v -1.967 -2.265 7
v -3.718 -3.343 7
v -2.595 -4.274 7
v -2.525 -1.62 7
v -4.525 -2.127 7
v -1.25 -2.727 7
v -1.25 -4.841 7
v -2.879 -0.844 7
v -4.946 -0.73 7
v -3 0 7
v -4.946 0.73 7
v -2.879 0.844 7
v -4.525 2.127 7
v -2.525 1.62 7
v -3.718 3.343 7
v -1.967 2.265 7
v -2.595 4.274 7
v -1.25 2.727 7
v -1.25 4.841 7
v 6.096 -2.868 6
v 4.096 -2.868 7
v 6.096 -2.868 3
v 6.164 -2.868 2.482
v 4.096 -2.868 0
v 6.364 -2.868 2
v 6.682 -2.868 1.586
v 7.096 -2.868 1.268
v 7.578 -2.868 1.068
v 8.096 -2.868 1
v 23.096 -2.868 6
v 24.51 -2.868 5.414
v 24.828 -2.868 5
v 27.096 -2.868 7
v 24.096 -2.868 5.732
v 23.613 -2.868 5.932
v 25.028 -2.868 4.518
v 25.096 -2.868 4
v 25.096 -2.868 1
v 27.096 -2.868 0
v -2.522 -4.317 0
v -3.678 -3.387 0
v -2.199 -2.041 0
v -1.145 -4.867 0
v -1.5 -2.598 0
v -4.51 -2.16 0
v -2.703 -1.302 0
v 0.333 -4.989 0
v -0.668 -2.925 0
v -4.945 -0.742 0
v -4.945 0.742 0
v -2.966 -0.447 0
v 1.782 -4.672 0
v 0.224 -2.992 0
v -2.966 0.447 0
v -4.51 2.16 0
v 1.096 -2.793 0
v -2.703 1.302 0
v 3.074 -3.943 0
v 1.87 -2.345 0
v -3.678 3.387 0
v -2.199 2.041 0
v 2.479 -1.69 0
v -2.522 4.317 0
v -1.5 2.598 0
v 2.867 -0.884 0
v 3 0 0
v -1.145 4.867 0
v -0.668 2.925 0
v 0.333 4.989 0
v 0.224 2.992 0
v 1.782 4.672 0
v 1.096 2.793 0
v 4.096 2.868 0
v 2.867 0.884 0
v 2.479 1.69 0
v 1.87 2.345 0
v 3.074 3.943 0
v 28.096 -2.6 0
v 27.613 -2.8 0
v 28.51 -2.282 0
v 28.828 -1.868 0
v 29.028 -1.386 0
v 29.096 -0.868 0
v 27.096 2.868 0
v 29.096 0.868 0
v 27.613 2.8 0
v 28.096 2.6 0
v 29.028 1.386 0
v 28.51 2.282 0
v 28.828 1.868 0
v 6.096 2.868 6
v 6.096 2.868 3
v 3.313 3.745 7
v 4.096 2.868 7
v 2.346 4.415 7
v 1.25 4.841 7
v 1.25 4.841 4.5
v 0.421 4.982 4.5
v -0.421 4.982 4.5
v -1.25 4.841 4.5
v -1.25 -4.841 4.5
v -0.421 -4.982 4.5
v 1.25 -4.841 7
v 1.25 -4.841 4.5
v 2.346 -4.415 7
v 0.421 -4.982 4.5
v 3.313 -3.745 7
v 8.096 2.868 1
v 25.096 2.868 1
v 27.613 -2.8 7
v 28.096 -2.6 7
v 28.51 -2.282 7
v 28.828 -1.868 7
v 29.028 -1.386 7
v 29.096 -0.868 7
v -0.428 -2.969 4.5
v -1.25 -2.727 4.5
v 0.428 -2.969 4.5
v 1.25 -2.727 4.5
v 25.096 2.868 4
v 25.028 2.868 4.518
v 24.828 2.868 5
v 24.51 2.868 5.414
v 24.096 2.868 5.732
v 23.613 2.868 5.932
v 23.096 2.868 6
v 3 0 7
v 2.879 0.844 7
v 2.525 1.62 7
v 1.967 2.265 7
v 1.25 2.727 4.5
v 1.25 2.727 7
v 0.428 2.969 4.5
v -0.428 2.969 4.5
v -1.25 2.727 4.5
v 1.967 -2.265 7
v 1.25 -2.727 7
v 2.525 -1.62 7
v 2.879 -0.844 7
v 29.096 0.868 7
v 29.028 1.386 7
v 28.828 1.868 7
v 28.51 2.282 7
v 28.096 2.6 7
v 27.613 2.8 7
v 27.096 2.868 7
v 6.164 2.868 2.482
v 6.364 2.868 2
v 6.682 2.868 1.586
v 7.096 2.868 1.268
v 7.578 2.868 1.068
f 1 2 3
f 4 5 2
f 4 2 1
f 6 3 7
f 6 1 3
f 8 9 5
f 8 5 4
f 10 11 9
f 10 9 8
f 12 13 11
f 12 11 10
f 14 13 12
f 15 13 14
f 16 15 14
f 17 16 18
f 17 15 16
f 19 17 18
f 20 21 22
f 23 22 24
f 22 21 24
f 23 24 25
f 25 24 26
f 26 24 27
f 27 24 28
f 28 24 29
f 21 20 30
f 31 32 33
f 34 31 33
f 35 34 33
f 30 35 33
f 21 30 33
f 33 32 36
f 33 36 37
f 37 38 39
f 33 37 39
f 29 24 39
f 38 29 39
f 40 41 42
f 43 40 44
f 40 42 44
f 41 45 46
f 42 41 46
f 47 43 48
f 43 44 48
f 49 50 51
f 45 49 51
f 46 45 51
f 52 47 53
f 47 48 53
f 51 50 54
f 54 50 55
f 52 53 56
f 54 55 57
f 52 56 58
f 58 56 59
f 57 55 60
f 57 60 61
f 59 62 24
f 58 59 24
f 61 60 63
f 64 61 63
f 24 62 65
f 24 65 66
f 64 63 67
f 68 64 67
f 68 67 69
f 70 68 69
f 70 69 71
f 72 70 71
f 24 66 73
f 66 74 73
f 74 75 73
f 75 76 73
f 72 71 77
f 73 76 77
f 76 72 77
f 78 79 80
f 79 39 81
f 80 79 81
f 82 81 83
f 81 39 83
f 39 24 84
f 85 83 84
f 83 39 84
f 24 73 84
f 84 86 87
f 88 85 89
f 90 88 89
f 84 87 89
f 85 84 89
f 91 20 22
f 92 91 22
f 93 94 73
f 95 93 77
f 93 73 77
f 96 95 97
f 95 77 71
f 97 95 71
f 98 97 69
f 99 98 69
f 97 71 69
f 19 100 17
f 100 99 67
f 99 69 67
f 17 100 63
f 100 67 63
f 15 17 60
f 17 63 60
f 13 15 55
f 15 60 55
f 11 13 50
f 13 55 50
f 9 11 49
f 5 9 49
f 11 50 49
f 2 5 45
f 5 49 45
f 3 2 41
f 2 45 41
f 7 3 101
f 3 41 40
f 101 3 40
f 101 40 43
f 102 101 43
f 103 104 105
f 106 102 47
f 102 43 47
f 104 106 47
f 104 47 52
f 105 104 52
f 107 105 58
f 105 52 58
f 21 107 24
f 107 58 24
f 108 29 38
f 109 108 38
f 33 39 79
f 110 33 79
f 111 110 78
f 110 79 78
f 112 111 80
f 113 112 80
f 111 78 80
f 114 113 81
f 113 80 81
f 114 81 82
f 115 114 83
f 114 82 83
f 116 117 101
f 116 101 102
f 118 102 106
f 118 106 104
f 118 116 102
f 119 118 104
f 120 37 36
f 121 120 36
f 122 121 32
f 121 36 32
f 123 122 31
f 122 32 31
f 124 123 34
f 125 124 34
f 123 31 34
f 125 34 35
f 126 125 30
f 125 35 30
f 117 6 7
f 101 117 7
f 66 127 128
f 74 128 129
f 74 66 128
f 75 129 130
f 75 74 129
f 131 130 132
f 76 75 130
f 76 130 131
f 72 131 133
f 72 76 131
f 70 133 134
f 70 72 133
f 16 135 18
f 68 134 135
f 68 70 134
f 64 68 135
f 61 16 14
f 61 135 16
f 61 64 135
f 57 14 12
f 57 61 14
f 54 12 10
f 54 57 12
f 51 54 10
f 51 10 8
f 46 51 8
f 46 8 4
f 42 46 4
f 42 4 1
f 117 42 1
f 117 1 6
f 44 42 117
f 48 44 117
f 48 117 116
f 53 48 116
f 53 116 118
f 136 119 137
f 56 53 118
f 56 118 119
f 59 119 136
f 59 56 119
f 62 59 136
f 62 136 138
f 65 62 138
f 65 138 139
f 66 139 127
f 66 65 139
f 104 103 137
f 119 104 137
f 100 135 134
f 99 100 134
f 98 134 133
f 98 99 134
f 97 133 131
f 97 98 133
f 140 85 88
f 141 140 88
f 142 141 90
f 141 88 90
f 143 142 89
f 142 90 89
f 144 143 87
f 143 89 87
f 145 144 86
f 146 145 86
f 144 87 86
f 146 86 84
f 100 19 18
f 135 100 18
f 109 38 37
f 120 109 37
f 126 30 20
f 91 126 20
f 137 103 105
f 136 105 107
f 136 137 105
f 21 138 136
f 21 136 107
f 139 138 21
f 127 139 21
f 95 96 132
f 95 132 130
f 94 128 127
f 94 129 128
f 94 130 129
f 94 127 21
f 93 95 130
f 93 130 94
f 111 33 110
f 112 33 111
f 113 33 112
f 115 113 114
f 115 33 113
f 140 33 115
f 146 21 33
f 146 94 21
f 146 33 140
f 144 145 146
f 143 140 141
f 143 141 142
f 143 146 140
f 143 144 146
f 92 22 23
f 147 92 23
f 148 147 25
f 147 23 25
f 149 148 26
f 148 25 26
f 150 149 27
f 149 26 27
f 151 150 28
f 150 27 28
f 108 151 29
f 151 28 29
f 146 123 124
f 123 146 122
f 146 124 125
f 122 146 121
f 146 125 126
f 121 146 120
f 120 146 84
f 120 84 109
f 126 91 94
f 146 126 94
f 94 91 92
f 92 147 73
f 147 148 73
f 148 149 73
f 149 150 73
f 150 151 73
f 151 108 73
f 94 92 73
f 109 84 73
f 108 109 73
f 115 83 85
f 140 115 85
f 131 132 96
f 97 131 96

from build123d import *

# Parameters (mm, degrees)
F0_R     = 3
F1_DEPTH = 7
F3_DEPTH = 25
F5_DEPTH = 2.5


with BuildPart() as f1:
    # F0 (on Top) → F1 (new body)
    with BuildSketch(Plane.XY):
        with BuildLine():
            Line((27.09576, 2.867882), (4.09576, 2.867882))
            ThreePointArc((4.09576, 2.867882), (-5, 0), (4.09576, -2.867882))
            Line((4.09576, -2.867882), (27.09576, -2.867882))
            ThreePointArc((27.09576, -2.867882), (28.509974, -2.282096), (29.09576, -0.867882))
            Line((29.09576, -0.867882), (29.09576, 0.867882))
            ThreePointArc((29.09576, 0.867882), (28.509974, 2.282096), (27.09576, 2.867882))
        make_face()
        Circle(F0_R, mode=Mode.SUBTRACT)
    extrude(amount=F1_DEPTH)

    # F2 (on face) → F3 (cut)
    with BuildSketch(Plane.XZ.offset(2.867882)):
        with BuildLine():
            Line((23.09576, 6), (6.09576, 6))
            Line((6.09576, 6), (6.09576, 3))
            ThreePointArc((6.09576, 3), (6.681547, 1.585786), (8.09576, 1))
            Line((8.09576, 1), (25.09576, 1))
            Line((25.09576, 1), (25.09576, 4))
            ThreePointArc((25.09576, 4), (24.509974, 5.414214), (23.09576, 6))
        make_face()
    extrude(amount=-F3_DEPTH, mode=Mode.SUBTRACT)

    # F4 (on face) → F5 (cut)
    with BuildSketch(Plane.XY.offset(7)):
        with BuildLine():
            Line((-1.25, 4.841229), (-1.25, 2.727178))
            ThreePointArc((-1.25, 2.727178), (0, 3), (1.25, 2.727178))
            Line((1.25, 2.727178), (1.25, 4.841229))
            ThreePointArc((1.25, 4.841229), (0, 5), (-1.25, 4.841229))
        make_face()
        with BuildLine():
            ThreePointArc((1.25, -2.727178), (0, -3), (-1.25, -2.727178))
            Line((-1.25, -2.727178), (-1.25, -4.841229))
            ThreePointArc((-1.25, -4.841229), (0, -5), (1.25, -4.841229))
            Line((1.25, -4.841229), (1.25, -2.727178))
        make_face()
    extrude(amount=-F5_DEPTH, mode=Mode.SUBTRACT)


solid = f1.part
